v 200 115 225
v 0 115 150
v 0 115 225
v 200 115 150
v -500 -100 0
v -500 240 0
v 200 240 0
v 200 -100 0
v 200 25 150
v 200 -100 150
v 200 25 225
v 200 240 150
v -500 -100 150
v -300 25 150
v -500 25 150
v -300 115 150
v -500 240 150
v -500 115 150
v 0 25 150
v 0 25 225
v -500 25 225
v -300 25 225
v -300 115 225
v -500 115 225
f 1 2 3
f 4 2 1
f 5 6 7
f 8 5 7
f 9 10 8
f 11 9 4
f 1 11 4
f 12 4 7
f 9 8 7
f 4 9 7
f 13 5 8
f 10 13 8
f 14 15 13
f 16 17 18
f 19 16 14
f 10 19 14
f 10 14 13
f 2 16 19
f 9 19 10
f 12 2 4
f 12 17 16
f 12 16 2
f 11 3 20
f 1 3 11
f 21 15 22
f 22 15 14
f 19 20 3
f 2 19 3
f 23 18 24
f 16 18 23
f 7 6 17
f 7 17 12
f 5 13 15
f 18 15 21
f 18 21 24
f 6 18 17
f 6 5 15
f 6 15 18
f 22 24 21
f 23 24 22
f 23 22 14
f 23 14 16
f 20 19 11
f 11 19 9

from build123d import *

# Parameters (mm, degrees)
SKETCH1_W           = 700
SKETCH1_H           = 340
BASE_EXTRUDE_DEPTH  = 150
SKETCH2_W           = 700
SKETCH2_H           = 90
BOSS_EXTRUDE1_DEPTH = 75
SKETCH3_W           = 300
SKETCH3_H           = 100
CUT_EXTRUDE1_DEPTH  = 75


with BuildPart() as part:
    # Sketch1 → Base-Extrude (new body)
    with BuildSketch(Plane.XY):
        with Locations((-150, 70)):
            Rectangle(SKETCH1_W, SKETCH1_H)
    extrude(amount=BASE_EXTRUDE_DEPTH)

    # Sketch2 → Boss-Extrude1 (add)
    with BuildSketch(Plane.XY.offset(150)):
        with Locations((-150, 70)):
            Rectangle(SKETCH2_W, SKETCH2_H)
    extrude(amount=BOSS_EXTRUDE1_DEPTH)

    # Sketch3 → Cut-Extrude1 (cut)
    with BuildSketch(Plane.XY.offset(225)):
        with Locations((-150, 70)):
            Rectangle(SKETCH3_W, SKETCH3_H)
    extrude(amount=-CUT_EXTRUDE1_DEPTH, mode=Mode.SUBTRACT)


solid = part.part
